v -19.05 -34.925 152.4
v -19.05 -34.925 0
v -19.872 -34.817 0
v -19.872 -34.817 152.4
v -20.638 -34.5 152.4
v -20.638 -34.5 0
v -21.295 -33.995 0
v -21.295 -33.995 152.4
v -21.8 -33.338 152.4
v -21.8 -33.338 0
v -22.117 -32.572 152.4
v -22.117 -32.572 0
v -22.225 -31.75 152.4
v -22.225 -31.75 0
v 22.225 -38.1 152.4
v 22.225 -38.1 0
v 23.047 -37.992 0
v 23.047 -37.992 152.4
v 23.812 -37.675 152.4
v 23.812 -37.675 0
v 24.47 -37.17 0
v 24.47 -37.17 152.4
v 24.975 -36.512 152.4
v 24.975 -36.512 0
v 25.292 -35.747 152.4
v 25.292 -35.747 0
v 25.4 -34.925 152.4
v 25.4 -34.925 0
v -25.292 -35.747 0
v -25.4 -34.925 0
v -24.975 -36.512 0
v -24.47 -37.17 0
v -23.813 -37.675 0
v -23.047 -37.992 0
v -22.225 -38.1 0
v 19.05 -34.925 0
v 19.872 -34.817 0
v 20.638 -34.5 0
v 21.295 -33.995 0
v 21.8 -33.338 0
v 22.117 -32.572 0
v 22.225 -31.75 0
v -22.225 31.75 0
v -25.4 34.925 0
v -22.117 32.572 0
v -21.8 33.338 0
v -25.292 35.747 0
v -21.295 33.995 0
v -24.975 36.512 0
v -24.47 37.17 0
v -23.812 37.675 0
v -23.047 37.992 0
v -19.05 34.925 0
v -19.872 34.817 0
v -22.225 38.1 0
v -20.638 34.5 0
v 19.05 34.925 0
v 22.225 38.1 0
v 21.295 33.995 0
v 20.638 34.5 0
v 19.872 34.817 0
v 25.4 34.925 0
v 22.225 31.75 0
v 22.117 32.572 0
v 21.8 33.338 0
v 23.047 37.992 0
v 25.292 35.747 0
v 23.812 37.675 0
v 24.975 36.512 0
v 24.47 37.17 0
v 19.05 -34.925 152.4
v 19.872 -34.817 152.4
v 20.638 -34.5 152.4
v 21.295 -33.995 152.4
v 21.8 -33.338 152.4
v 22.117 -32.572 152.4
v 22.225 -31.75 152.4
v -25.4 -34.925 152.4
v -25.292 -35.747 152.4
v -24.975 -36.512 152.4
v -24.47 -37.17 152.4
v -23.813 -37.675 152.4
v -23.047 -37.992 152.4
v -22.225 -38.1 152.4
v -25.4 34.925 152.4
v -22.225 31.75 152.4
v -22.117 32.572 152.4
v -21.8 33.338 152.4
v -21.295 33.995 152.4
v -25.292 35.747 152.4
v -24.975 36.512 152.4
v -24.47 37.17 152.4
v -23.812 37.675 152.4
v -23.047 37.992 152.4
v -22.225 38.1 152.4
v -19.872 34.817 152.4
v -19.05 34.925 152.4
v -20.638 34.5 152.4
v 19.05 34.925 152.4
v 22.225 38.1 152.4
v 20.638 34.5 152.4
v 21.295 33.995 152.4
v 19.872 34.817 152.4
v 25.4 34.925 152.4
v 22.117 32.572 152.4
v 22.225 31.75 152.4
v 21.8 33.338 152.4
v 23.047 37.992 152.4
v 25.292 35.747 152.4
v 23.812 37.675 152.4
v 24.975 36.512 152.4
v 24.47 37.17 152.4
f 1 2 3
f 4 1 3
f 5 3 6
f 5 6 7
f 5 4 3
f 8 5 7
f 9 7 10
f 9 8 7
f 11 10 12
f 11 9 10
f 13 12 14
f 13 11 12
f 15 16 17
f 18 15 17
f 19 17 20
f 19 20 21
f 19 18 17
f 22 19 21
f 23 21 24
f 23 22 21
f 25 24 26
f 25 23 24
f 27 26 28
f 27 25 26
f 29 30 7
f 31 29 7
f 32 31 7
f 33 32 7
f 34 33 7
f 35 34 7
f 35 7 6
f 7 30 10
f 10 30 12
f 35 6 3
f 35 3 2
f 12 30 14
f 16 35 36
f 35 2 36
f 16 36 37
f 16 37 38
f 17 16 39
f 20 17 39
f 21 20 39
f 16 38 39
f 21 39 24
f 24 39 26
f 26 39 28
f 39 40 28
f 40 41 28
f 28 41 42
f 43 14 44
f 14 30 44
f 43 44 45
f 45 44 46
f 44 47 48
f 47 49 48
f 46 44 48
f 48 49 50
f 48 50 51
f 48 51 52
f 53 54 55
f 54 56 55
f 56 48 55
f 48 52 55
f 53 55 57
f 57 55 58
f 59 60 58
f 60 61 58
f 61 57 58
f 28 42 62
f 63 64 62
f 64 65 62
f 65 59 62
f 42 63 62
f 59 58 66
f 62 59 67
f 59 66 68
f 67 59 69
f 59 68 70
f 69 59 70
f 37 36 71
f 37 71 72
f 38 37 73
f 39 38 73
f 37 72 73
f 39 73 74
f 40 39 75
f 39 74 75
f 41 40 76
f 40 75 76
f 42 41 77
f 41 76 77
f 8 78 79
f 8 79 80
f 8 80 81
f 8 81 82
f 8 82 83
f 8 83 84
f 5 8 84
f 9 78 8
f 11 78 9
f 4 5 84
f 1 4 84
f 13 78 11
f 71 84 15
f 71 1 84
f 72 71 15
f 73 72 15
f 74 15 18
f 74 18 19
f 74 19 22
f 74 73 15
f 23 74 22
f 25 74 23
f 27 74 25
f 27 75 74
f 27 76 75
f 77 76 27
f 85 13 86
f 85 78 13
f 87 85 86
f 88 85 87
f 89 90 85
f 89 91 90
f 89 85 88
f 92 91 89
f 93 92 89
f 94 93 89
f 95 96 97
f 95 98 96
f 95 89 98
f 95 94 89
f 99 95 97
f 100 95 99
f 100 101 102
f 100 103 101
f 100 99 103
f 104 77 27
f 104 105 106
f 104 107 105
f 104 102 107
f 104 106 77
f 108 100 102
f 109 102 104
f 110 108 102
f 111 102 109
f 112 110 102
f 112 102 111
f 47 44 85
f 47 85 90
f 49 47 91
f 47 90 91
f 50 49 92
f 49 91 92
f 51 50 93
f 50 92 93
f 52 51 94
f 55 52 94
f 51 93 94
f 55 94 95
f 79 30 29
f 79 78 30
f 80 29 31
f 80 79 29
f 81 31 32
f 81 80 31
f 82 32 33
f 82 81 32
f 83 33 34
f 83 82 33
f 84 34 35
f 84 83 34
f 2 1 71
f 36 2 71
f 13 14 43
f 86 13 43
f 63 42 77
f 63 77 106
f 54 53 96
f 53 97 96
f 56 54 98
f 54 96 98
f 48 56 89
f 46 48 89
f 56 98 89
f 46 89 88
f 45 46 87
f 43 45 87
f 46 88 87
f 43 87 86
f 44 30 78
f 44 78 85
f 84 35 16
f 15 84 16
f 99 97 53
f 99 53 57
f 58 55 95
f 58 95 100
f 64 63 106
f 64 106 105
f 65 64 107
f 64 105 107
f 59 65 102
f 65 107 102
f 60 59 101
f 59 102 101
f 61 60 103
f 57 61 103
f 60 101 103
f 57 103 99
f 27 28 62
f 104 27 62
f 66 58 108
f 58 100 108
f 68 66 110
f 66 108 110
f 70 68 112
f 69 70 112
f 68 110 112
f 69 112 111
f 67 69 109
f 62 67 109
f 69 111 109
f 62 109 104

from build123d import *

# Parameters (mm, degrees)
F0_W     = 50.8
F0_H     = 76.2
F0_W_2   = 44.45
F0_H_2   = 69.85
F2_DEPTH = 152.4
F3_R     = 3.175


# Not quite as in the source:
# - a variable given as a bare number and used for a length is read in inches; the dataset says mm whatever the document's units were


with BuildPart() as f2:
    # F0 (on Top) → F2 (new body)
    with BuildSketch(Plane.XY):
        Rectangle(F0_W, F0_H)
        Rectangle(F0_W_2, F0_H_2, mode=Mode.SUBTRACT)
    extrude(amount=F2_DEPTH)

    # F3
    f3_edges = [f2.edges().sort_by_distance(p)[0] for p in [
        (-22.225, 34.925, 76.2),
        (22.225, 34.925, 76.2),
        (22.225, -34.925, 76.2),
        (-22.225, -34.925, 76.2),
        (25.4, 38.1, 76.2),
        (-25.4, 38.1, 76.2),
        (25.4, -38.1, 76.2),
        (-25.4, -38.1, 76.2),
    ]]
    fillet(f3_edges, radius=F3_R)


solid = f2.part
